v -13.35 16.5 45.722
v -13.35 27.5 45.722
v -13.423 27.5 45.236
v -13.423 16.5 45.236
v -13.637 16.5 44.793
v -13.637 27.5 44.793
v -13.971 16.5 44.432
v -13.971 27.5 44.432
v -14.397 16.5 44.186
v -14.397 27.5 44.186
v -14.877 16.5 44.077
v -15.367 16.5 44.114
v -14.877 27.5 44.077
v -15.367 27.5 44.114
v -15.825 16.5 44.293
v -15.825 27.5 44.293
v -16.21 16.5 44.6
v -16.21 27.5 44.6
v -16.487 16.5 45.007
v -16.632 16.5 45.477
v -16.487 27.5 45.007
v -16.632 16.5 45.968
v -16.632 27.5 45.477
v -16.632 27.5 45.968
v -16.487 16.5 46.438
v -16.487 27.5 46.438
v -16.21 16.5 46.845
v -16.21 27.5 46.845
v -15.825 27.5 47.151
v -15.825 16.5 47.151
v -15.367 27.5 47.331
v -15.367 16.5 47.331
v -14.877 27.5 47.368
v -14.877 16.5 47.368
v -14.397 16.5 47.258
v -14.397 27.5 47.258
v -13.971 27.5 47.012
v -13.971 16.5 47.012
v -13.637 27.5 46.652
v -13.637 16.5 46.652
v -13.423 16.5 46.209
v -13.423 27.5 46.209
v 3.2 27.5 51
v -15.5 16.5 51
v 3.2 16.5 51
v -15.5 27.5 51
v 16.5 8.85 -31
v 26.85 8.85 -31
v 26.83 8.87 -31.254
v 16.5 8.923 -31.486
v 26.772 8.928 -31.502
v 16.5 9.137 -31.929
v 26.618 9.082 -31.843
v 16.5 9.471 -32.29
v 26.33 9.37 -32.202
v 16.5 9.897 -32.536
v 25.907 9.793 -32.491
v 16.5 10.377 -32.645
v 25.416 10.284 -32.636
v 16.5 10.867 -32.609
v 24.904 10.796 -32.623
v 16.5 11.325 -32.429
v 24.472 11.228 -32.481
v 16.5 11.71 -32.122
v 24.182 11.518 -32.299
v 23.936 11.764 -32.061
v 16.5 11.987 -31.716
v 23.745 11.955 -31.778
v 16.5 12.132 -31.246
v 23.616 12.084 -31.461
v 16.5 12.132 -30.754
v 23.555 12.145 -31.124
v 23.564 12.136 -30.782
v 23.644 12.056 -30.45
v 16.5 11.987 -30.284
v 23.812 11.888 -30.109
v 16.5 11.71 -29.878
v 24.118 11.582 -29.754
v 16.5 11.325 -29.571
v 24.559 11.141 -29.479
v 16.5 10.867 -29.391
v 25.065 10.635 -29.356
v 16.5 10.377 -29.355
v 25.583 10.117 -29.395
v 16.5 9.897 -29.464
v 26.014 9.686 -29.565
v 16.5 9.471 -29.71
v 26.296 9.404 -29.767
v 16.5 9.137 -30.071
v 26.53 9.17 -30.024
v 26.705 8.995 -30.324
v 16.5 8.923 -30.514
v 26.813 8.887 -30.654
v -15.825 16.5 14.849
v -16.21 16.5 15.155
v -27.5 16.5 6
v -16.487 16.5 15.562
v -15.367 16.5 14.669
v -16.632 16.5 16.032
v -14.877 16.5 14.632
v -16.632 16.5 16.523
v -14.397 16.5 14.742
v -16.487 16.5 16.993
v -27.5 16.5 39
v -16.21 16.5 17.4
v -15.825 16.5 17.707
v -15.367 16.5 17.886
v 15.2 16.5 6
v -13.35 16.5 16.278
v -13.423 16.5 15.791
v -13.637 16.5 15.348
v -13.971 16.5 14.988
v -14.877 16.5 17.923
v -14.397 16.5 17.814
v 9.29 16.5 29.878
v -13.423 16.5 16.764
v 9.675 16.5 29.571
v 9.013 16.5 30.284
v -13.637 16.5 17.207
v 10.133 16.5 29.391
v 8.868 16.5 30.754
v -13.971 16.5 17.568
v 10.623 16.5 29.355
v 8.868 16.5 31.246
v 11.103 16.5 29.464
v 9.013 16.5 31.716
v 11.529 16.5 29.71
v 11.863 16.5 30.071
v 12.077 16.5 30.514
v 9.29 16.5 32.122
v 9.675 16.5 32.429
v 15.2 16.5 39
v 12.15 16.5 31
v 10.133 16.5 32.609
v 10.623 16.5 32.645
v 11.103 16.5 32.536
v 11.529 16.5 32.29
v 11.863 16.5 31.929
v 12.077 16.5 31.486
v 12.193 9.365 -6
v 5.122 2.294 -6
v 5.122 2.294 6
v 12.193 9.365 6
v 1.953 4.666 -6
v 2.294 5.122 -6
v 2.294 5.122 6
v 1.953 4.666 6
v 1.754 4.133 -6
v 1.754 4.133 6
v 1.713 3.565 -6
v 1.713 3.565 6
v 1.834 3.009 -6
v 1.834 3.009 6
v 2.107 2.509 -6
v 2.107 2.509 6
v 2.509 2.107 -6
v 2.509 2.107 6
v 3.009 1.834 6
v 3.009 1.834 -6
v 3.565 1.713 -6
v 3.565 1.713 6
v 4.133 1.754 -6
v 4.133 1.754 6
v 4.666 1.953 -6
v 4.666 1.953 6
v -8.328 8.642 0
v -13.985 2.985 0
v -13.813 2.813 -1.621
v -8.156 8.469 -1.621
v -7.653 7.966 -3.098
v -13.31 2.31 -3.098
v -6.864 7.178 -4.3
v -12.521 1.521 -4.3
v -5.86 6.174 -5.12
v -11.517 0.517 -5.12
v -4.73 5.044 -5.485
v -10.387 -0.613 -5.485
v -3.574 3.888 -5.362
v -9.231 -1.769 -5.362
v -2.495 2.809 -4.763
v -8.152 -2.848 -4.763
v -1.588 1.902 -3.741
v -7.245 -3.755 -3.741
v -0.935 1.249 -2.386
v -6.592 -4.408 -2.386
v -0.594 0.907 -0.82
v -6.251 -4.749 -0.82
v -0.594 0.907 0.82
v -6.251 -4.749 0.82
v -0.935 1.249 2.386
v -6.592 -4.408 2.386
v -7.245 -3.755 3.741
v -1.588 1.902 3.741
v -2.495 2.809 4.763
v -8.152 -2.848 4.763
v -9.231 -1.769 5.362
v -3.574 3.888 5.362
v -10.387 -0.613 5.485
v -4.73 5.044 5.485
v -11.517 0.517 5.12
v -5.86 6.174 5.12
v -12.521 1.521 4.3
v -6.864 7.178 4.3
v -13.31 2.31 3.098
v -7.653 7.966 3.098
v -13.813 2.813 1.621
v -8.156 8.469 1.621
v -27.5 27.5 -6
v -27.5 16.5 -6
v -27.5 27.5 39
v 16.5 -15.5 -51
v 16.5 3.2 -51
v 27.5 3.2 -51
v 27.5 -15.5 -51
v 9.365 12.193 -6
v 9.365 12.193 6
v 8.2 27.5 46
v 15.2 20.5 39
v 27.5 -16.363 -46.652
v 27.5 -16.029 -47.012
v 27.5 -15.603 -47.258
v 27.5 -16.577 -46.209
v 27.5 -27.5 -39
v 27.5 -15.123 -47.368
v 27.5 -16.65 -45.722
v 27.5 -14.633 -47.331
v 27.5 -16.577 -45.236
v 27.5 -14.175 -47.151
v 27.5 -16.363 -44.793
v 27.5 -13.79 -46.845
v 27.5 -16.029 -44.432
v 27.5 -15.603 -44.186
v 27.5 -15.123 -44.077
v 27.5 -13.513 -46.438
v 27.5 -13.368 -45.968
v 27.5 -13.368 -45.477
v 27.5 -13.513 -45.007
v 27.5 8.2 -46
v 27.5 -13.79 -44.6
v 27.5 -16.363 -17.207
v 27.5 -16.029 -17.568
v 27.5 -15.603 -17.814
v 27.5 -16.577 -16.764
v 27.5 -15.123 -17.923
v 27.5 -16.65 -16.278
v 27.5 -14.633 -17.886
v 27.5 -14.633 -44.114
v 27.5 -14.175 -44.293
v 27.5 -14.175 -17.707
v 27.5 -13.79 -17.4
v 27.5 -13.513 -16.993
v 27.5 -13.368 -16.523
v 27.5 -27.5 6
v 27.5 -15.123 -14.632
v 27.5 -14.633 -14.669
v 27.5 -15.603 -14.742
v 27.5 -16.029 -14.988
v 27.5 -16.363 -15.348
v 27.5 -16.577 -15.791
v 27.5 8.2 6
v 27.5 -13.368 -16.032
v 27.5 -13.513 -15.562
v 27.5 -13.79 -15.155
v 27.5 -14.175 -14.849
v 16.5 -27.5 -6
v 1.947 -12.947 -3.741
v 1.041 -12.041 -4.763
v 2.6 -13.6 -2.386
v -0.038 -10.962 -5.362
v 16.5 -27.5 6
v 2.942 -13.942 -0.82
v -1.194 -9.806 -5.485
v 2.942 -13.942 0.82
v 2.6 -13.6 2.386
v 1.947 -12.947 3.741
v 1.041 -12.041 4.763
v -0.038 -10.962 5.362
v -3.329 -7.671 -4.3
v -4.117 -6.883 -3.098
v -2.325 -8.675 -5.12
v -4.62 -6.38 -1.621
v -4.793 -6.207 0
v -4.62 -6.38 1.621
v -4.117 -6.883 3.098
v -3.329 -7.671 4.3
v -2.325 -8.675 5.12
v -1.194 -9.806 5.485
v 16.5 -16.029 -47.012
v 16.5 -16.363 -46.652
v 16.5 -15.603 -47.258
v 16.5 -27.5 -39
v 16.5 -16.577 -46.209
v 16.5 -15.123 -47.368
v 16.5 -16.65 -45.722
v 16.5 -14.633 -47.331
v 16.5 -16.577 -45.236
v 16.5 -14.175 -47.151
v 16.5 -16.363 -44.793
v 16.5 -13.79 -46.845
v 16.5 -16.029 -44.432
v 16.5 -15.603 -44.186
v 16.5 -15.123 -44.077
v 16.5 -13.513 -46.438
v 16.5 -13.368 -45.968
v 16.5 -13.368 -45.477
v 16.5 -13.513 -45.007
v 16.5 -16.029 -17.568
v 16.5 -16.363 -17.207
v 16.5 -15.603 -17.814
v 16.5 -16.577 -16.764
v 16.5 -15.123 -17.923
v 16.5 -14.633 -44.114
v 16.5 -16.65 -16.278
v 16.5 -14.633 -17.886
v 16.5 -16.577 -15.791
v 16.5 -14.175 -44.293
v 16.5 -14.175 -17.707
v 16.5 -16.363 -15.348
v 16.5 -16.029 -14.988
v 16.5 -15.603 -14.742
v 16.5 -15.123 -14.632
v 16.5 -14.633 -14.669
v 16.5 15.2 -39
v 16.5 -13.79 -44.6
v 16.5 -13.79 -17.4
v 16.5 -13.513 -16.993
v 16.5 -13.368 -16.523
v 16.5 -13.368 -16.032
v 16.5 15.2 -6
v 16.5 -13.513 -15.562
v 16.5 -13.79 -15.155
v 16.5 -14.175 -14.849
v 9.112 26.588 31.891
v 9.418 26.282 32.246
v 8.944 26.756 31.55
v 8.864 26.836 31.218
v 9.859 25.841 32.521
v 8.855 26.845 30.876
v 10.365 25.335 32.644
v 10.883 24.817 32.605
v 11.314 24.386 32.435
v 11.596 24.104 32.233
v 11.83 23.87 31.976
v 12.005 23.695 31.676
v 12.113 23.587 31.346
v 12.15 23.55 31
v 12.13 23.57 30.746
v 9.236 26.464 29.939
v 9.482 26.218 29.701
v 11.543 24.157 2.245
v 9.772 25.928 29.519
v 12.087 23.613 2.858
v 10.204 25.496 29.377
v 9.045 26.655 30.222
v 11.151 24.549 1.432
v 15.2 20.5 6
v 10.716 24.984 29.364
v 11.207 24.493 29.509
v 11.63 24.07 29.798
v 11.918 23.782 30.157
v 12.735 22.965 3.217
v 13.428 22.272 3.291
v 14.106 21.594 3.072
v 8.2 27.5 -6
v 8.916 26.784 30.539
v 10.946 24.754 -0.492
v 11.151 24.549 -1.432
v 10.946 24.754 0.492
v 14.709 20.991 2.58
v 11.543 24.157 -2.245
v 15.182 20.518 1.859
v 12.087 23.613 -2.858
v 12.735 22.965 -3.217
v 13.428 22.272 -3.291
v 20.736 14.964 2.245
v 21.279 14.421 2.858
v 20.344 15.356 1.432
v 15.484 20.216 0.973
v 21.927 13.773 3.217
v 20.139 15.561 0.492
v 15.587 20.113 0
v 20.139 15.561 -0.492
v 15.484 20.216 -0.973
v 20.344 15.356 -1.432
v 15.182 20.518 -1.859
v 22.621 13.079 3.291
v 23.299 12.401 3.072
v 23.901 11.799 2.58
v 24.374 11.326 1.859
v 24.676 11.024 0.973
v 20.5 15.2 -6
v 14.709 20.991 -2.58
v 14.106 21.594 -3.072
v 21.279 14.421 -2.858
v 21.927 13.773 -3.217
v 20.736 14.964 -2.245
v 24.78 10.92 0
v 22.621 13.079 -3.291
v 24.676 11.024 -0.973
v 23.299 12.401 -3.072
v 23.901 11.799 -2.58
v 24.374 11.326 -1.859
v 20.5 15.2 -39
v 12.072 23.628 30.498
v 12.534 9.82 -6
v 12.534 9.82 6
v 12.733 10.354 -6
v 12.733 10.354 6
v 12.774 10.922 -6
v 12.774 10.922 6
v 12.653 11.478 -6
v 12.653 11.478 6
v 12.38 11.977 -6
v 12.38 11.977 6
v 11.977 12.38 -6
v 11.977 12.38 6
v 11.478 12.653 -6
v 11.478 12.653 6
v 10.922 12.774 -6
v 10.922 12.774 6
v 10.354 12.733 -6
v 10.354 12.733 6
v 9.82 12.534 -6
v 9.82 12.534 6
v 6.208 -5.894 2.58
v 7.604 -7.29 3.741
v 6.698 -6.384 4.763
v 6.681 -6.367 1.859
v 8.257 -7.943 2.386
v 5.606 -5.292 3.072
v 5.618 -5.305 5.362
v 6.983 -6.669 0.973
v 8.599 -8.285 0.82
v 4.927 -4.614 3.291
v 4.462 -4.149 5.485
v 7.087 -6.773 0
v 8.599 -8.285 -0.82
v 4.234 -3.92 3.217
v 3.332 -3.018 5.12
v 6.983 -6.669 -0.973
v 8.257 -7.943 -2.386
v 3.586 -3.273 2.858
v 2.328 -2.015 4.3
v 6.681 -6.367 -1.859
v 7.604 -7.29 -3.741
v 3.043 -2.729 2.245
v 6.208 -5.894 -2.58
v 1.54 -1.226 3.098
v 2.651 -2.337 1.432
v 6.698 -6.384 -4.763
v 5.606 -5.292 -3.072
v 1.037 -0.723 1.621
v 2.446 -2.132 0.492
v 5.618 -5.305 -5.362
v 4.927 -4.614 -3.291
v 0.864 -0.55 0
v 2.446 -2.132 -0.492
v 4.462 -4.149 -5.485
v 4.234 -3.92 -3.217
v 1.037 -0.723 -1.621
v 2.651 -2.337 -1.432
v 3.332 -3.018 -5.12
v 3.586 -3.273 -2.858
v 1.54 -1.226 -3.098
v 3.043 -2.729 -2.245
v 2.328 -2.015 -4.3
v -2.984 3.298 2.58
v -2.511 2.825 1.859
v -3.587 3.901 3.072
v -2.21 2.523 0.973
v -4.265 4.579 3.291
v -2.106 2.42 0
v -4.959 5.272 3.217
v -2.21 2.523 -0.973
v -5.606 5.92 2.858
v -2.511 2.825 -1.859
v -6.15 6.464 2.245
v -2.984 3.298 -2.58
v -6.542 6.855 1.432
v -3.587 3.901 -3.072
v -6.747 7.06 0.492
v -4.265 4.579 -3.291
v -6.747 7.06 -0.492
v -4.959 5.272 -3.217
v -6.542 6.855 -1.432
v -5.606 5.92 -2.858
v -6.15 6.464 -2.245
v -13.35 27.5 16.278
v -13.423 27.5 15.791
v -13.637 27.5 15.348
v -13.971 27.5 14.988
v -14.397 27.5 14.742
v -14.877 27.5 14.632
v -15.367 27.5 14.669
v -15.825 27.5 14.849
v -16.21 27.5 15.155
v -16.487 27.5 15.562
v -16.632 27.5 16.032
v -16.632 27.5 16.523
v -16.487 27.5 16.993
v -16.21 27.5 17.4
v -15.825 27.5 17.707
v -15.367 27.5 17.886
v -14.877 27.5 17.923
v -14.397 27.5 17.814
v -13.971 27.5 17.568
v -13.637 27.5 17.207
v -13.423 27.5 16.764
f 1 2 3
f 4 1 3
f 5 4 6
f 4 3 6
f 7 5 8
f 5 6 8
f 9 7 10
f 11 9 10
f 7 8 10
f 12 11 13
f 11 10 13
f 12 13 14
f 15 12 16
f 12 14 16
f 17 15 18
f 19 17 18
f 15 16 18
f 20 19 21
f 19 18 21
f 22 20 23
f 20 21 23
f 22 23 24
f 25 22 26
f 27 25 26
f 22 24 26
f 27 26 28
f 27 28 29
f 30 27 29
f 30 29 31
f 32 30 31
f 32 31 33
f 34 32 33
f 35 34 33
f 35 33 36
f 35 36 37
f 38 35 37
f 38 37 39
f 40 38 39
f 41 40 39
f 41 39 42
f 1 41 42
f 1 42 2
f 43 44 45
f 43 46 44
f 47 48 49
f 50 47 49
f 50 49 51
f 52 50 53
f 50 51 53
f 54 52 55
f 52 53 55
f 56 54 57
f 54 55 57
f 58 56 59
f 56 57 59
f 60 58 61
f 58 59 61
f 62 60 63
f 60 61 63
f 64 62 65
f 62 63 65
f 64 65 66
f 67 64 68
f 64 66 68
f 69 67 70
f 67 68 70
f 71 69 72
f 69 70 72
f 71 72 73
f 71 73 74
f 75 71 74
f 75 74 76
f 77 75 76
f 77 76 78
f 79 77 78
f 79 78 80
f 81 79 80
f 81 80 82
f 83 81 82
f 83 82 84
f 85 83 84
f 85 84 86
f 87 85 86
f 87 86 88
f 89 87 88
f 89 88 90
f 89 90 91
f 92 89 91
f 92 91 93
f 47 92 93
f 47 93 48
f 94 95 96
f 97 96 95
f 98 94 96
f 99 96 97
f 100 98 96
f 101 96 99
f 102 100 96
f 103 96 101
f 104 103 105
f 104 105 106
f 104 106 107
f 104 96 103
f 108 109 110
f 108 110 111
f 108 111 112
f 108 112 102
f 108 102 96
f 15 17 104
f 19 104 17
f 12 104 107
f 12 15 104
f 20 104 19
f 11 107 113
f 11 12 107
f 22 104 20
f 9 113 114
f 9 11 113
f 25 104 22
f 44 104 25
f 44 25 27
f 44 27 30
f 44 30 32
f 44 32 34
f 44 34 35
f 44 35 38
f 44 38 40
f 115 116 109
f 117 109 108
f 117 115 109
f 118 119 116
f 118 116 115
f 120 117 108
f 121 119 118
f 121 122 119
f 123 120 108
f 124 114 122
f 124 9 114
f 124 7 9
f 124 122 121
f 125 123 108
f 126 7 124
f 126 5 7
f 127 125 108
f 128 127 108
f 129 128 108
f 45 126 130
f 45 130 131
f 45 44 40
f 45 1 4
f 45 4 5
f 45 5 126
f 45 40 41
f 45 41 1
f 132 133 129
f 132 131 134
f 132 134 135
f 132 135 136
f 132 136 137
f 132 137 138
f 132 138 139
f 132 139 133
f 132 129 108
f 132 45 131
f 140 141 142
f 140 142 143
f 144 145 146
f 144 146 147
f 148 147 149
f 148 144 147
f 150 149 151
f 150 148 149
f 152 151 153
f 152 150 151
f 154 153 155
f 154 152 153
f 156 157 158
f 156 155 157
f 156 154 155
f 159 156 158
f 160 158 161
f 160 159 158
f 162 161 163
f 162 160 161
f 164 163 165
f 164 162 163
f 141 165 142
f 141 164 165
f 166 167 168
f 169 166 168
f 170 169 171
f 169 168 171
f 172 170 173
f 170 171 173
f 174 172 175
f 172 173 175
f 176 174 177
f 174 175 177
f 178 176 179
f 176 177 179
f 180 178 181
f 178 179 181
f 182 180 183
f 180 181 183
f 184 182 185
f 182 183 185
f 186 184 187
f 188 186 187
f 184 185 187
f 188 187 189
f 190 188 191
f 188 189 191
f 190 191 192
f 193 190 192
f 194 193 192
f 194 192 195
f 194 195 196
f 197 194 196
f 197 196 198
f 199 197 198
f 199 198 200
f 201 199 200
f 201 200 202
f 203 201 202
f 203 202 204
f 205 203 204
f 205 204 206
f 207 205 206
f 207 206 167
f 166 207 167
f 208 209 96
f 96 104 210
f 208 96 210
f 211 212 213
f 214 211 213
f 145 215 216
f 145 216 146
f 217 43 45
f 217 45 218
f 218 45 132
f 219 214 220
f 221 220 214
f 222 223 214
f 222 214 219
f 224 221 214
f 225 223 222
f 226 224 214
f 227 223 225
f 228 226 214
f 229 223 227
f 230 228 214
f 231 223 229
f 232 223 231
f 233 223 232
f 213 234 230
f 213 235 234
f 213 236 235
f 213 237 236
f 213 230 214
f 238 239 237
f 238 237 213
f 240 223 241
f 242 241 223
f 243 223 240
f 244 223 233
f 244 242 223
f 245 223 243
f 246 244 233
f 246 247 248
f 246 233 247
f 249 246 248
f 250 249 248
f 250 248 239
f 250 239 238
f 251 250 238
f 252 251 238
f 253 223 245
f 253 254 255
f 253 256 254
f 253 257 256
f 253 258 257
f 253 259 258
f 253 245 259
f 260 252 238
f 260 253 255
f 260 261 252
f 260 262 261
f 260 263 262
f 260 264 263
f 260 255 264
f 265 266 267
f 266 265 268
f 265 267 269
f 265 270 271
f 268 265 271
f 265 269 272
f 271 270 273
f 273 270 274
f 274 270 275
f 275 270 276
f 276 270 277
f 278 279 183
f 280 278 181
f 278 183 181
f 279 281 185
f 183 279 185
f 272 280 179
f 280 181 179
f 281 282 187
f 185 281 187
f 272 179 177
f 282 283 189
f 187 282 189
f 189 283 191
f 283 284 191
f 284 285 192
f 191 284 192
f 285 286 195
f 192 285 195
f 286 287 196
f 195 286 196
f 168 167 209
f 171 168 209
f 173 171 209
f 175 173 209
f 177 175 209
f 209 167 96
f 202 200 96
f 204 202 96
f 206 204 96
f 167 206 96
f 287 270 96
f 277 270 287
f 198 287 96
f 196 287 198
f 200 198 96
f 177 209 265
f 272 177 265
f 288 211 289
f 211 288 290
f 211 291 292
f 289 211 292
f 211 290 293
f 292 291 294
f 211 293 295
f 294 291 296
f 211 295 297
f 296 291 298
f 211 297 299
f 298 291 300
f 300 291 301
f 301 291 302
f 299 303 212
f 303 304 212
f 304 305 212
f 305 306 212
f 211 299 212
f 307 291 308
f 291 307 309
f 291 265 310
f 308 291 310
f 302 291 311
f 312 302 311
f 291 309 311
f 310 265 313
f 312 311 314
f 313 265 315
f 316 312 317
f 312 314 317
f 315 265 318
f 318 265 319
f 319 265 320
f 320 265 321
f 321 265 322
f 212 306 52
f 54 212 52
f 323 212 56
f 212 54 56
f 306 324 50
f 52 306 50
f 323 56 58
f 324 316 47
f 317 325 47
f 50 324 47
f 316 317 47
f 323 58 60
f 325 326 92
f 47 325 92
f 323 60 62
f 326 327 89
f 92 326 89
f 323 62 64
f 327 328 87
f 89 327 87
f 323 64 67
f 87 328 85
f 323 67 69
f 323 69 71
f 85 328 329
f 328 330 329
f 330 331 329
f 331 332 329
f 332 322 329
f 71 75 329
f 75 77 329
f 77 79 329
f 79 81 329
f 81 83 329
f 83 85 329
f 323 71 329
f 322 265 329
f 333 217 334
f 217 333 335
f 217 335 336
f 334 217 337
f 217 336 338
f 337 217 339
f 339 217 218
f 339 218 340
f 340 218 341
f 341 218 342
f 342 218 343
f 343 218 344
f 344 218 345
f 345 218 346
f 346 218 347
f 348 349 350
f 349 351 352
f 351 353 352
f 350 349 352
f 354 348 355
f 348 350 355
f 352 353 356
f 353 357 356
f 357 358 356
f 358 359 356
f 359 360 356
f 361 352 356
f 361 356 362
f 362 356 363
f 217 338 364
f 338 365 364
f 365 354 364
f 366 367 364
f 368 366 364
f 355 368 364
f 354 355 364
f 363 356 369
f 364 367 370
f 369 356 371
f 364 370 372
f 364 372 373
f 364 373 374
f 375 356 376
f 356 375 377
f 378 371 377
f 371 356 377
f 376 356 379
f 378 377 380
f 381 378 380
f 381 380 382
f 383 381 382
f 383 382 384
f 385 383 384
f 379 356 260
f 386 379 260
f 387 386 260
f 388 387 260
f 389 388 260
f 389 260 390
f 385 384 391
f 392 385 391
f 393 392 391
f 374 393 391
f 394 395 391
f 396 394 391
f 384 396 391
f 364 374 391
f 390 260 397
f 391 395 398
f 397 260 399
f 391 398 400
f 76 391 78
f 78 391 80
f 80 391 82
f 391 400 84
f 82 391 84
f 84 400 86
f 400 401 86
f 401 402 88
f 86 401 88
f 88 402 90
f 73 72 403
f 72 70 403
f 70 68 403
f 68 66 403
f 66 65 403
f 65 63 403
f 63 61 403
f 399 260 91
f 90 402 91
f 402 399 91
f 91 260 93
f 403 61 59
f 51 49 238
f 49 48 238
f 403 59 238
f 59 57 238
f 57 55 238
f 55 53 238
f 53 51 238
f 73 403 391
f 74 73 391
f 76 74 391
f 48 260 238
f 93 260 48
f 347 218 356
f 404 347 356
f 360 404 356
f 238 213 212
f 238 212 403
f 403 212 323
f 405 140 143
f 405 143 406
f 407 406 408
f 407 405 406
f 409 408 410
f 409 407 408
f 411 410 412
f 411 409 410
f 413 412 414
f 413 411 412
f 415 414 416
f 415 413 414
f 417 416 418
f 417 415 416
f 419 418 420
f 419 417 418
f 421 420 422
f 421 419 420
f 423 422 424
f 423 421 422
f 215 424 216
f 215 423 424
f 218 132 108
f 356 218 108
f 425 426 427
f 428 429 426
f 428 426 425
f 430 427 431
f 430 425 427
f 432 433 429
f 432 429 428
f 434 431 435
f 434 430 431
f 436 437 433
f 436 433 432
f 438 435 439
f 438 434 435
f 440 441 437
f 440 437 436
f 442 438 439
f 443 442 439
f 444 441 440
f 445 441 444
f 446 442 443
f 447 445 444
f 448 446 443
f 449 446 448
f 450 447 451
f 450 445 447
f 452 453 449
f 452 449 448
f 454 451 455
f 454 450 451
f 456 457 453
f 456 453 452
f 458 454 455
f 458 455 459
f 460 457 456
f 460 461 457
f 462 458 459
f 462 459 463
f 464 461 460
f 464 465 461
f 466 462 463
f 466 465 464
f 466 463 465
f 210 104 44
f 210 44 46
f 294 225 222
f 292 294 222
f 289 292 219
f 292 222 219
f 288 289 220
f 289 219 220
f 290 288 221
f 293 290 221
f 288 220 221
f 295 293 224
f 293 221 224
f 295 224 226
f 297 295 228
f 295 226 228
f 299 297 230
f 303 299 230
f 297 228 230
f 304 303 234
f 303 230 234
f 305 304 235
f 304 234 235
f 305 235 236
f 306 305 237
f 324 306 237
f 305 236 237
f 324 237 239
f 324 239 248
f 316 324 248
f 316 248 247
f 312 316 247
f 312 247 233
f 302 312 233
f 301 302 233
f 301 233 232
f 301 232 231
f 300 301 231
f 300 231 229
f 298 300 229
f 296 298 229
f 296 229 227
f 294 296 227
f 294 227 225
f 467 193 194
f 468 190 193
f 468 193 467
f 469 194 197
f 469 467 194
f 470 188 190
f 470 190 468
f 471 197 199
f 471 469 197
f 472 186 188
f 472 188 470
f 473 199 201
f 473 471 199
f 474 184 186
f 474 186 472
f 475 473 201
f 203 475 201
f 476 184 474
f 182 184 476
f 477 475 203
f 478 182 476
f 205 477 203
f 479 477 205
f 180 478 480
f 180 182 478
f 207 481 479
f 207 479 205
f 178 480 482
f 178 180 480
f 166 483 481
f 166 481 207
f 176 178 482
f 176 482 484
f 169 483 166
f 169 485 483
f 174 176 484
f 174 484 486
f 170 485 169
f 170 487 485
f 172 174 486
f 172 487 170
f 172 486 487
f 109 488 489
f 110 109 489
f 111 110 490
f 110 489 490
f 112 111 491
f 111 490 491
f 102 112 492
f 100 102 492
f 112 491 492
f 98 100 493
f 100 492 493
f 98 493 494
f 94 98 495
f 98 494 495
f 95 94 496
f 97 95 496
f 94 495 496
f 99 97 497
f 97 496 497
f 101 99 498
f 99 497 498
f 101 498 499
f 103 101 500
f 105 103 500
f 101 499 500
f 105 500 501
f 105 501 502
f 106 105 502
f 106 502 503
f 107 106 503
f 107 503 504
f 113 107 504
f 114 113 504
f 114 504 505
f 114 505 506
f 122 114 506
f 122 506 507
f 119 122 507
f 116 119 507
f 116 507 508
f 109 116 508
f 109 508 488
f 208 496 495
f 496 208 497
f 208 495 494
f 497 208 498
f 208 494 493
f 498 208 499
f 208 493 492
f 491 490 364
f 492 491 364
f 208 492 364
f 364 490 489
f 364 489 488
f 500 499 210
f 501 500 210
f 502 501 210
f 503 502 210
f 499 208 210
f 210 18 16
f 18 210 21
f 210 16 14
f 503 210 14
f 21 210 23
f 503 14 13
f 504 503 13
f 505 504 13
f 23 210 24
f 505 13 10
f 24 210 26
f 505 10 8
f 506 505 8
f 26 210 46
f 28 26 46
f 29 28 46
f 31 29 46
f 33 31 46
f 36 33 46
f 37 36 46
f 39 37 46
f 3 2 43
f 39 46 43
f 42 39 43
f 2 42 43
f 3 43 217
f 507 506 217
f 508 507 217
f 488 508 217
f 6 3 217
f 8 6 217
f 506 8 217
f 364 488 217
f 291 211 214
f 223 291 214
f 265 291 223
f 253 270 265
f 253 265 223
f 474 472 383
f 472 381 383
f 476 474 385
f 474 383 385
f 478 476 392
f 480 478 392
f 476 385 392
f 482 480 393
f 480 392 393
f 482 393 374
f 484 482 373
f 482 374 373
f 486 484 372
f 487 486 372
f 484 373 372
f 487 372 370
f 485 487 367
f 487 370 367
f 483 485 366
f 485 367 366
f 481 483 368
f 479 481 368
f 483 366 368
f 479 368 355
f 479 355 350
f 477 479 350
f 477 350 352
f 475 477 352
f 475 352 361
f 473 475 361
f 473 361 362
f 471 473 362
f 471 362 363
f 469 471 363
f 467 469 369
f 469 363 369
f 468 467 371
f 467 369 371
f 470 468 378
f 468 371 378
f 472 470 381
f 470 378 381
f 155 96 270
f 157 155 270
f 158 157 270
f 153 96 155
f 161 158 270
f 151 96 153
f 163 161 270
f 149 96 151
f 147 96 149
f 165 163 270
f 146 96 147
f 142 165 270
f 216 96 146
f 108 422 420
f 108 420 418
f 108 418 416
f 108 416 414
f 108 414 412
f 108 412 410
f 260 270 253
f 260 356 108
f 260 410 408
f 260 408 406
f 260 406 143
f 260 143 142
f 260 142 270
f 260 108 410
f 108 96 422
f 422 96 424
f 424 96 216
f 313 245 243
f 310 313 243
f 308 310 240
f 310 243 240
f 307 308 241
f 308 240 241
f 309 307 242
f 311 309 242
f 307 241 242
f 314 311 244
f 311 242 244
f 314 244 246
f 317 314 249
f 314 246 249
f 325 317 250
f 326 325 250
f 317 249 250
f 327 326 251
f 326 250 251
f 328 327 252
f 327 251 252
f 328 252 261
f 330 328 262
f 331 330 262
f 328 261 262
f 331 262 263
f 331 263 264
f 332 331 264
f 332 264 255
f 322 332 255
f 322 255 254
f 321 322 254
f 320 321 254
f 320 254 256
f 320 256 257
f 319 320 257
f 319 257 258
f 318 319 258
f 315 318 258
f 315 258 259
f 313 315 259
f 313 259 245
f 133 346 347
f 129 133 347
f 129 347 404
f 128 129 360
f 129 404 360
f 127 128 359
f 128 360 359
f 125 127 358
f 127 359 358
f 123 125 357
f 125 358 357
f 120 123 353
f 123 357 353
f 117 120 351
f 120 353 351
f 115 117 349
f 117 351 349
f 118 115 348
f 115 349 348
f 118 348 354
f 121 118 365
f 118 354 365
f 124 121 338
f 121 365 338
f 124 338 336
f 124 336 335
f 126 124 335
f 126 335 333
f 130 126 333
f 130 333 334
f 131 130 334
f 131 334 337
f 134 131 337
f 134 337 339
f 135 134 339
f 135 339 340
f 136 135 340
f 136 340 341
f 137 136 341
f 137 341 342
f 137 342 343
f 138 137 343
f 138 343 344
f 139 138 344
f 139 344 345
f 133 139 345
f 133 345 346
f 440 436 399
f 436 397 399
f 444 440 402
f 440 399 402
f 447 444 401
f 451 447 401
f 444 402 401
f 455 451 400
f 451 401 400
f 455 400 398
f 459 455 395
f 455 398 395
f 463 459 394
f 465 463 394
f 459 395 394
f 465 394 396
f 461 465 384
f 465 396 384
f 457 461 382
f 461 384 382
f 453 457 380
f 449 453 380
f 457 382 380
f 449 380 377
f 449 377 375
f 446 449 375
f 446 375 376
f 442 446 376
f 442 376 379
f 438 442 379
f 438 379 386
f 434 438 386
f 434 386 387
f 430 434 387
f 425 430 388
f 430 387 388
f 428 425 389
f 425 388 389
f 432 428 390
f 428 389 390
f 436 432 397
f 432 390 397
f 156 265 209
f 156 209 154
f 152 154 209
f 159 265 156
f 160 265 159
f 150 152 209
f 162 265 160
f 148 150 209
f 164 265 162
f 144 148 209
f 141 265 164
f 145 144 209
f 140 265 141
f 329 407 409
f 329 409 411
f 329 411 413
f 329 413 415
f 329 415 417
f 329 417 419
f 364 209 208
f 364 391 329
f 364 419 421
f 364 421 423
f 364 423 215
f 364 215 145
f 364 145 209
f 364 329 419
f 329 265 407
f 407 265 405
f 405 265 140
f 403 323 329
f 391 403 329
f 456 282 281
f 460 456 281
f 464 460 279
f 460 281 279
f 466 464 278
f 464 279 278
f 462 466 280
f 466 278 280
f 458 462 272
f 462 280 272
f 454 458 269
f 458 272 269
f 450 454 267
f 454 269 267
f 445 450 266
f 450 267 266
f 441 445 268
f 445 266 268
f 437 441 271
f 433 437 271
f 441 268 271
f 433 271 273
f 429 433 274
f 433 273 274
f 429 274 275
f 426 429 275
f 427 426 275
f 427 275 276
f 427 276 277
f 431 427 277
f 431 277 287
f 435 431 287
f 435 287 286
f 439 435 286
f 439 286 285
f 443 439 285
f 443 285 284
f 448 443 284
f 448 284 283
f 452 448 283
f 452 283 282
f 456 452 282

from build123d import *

# Parameters (mm, degrees)
SKETCH_1_W                = 55
SKETCH_1_H                = 55
EXTRUDE_1_DEPTH           = 51
CUT_EXTRUDE_1_DEPTH       = 110.162722575
CHAMFER_1_SIZE            = 19.3
CUT_EXTRUDE_START         = -11
SKETCH_11_W               = 55
SKETCH_11_H               = 45
CUT_EXTRUDE_2_DEPTH       = 69.888985474
CUT_EXTRUDE_START_2       = 11
SKETCH_12_W               = 55
SKETCH_12_H               = 45
CUT_EXTRUDE_3_DEPTH       = 69.888985474
HOLE_WIZARD_M4_1_D        = 3.3
HOLE_WIZARD_M4_2_D        = 3.3
HOLE_WIZARD_1_D           = 6.6
HOLE_WIZARD_1_CBORE_D     = 11
HOLE_WIZARD_1_CBORE_DEPTH = 8
CUT_EXTRUDE_5_DEPTH       = 73.754724932
CUT_EXTRUDE_6_DEPTH       = 73.754724932
CHAMFER_2_SIZE            = 12
CUT_EXTRUDE_7_DEPTH       = 70.003623093


with BuildPart() as part:
    # 草图1 → 凸台-拉伸1 (new, symmetric)
    with BuildSketch(Plane.XY):
        Rectangle(SKETCH_1_W, SKETCH_1_H)
    extrude(amount=EXTRUDE_1_DEPTH, both=True)

    # 草图2 → 切除-拉伸1 (cut, through all)
    with BuildSketch(Plane.XY.offset(51)):
        Polygon((-27.5, -27.5), (16.5, -27.5), (-27.5, 16.5), align=None)
    extrude(amount=-CUT_EXTRUDE_1_DEPTH, mode=Mode.SUBTRACT)

    # 倒角1
    chamfer_1_edges = [part.edges().sort_by_distance(p)[0] for p in [
        (27.5, 27.5, 0),
    ]]
    chamfer(chamfer_1_edges, length=CHAMFER_1_SIZE)

    # 草图11 → 切除-拉伸2 (cut, through all)
    with BuildSketch(Plane.YZ.offset(27.5).offset(CUT_EXTRUDE_START)):
        with Locations((0, -28.5)):
            Rectangle(SKETCH_11_W, SKETCH_11_H)
    extrude(amount=-CUT_EXTRUDE_2_DEPTH, mode=Mode.SUBTRACT)

    # 草图12 → 切除-拉伸3 (cut, through all)
    with BuildSketch(Plane.XZ.offset(-27.5).offset(CUT_EXTRUDE_START_2)):
        with Locations((0, 28.5)):
            Rectangle(SKETCH_12_W, SKETCH_12_H)
    extrude(amount=CUT_EXTRUDE_3_DEPTH, mode=Mode.SUBTRACT)

    # M4 螺纹孔1 (through all)
    with Locations(Plane(origin=(16.5, -23.392318354, -4.126238011), x_dir=(0, 1, 0), z_dir=(-1, 0, 0))):
        with Locations((33.892318354, 26.873761989), (8.392318354, 41.596193853), (8.392318354, 12.151330125)):
            Hole(HOLE_WIZARD_M4_1_D / 2)

    # M4 螺纹孔2 (through all)
    with Locations(Plane(origin=(-3.776378322, 16.5, -11.360569787), x_dir=(-1, 0, 0), z_dir=(0, -1, 0))):
        with Locations((-14.276378322, -42.360569787), (11.223621678, -57.083001652), (11.223621678, -27.638137923)):
            Hole(HOLE_WIZARD_M4_2_D / 2)

    # 打孔尺寸根据内六角圆柱头螺钉的类型1 (through all)
    with Locations(Plane(origin=(-5.5, -5.5, 0), x_dir=(-0.7071067811865475, 0.7071067811865477, 0), z_dir=(-0.7071067811865477, -0.7071067811865475, 0))):
        with Locations((6.5, 0), (-6.5, 0)):
            CounterBoreHole(HOLE_WIZARD_1_D / 2, HOLE_WIZARD_1_CBORE_D / 2, HOLE_WIZARD_1_CBORE_DEPTH)

    # 草图22 → 切除-拉伸5 (cut, through all)
    with BuildSketch(Plane.XZ.offset(-16.5)):
        Polygon((3.2, 51), (15.2, 39), (15.2, 6), (19.2, 6), (19.2, 51), align=None)
    extrude(amount=-CUT_EXTRUDE_5_DEPTH, mode=Mode.SUBTRACT)

    # 草图23 → 切除-拉伸6 (cut, through all)
    with BuildSketch(Plane.ZY.offset(-16.5)):
        Polygon((-51, 19.2), (-51, 3.2), (-39, 15.2), (-6, 15.2), (-6, 19.2), align=None)
    extrude(amount=-CUT_EXTRUDE_6_DEPTH, mode=Mode.SUBTRACT)

    # 倒角2
    chamfer_2_edges = [part.edges().sort_by_distance(p)[0] for p in [
        (-27.5, 22, 51),
        (22, -27.5, -51),
    ]]
    chamfer(chamfer_2_edges, length=CHAMFER_2_SIZE)

    # 草图24 → 切除-拉伸7 (cut, through all)
    with BuildSketch(Plane(origin=(0, 0, -6), x_dir=(-1, 0, 0), z_dir=(0, 0, -1))):
        with BuildLine():
            Line((-5.122077939, 2.293650814), (-12.193145751, 9.364718626))
            ThreePointArc((-12.193145751, 9.364718626), (-12.193145751, 12.193145751), (-9.364718626, 12.193145751))
            Line((-9.364718626, 12.193145751), (-2.293650814, 5.122077939))
            ThreePointArc((-2.293650814, 5.122077939), (-2.293650814, 2.293650814), (-5.122077939, 2.293650814))
        make_face()
    extrude(amount=-CUT_EXTRUDE_7_DEPTH, mode=Mode.SUBTRACT)


solid = part.part
